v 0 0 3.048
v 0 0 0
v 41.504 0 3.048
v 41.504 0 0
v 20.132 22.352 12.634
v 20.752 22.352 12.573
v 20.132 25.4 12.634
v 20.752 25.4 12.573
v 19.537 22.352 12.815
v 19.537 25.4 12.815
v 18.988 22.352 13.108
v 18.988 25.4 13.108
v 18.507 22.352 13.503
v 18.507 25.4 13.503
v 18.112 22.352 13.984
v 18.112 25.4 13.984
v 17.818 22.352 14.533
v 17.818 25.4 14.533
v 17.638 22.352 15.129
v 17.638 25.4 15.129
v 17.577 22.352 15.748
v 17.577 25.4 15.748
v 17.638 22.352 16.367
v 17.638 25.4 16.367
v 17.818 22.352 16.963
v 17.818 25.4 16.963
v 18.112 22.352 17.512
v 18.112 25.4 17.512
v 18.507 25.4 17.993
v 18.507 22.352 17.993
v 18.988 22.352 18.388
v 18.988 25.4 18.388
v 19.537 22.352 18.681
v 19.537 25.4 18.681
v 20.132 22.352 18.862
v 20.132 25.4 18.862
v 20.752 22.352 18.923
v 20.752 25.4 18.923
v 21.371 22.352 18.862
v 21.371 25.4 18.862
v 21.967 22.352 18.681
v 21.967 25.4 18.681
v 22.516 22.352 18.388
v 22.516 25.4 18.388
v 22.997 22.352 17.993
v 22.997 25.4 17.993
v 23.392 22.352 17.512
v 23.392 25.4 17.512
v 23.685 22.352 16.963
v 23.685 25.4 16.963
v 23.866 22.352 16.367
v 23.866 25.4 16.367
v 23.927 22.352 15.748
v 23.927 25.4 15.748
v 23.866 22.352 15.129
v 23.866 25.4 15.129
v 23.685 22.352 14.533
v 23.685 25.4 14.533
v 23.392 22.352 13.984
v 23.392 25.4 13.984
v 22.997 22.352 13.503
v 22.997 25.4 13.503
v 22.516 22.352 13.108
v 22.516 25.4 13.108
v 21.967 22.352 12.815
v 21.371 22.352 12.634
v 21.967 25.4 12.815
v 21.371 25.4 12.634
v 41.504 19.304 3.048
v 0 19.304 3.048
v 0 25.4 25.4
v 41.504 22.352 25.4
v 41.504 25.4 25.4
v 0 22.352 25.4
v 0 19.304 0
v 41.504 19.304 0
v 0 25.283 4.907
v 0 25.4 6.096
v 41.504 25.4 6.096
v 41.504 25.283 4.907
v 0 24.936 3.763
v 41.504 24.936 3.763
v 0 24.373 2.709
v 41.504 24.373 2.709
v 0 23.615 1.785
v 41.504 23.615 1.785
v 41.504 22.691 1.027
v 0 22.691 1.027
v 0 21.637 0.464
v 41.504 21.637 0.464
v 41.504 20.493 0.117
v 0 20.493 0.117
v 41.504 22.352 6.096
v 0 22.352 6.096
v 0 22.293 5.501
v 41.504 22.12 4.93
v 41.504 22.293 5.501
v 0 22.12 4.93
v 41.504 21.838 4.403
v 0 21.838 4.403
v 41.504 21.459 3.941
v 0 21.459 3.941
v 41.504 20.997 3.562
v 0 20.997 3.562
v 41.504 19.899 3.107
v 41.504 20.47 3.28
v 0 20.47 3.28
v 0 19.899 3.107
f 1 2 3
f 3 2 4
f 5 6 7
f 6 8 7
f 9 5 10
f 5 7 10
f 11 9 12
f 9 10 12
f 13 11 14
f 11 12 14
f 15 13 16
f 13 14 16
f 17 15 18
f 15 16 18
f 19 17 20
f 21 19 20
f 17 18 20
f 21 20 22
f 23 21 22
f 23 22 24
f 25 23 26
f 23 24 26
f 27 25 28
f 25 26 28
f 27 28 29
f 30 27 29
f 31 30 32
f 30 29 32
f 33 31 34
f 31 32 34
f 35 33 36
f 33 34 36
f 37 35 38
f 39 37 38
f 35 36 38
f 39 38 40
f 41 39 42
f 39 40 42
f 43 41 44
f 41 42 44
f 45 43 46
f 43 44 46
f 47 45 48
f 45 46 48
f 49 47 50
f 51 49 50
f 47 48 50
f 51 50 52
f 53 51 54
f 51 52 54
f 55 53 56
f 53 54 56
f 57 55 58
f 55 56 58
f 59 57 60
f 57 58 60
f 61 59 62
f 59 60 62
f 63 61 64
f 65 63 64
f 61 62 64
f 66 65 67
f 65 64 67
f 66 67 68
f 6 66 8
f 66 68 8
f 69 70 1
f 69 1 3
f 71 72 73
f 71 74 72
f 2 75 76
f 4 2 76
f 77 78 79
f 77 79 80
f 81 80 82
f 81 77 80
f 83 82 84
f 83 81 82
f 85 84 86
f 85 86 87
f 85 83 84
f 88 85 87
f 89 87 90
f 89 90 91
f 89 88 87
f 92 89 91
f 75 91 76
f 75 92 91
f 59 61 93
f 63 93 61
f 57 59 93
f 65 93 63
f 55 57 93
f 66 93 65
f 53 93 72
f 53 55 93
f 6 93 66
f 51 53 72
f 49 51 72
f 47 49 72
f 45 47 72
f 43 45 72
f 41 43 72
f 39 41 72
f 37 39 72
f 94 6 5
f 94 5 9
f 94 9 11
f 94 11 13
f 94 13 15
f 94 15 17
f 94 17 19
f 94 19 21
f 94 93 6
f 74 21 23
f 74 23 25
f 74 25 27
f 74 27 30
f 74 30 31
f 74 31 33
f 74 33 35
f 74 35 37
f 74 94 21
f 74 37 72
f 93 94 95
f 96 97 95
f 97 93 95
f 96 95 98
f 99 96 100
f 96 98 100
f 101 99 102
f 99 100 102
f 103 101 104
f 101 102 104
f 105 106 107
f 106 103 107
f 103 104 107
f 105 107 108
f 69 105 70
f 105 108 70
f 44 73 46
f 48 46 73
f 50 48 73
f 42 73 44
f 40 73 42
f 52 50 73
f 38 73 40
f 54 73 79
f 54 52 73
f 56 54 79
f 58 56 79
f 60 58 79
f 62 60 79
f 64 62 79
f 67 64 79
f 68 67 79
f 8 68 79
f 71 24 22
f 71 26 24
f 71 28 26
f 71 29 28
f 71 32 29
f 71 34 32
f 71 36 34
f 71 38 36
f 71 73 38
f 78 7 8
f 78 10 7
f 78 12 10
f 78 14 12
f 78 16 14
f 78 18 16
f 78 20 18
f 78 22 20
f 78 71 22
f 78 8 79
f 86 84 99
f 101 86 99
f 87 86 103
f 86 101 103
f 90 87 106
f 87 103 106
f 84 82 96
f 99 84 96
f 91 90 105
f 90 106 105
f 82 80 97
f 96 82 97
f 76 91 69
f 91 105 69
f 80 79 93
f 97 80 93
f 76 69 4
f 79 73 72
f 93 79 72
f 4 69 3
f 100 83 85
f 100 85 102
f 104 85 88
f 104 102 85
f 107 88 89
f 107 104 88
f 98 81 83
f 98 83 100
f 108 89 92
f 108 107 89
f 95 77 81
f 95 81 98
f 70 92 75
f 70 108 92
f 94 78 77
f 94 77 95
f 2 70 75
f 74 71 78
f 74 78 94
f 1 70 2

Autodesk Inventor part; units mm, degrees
ref_plane "YZ Plane" through (0, 0, 0) normal (1, 0, 0) x (0, 1, 0)
ref_plane "XZ Plane" through (0, 0, 0) normal (0, 1, 0) x (-1, 0, 0)
ref_plane "XY Plane" through (0, 0, 0) normal (0, 0, 1) x (1, 0, 0)
sketch "Sketch1" plane through (0, 0, 0) normal (0, 0, 1) x (1, 0, 0)
  line L0 (0, 0) -> (41.5036, 0)
  line L1 (41.5036, 0) -> (41.5036, 25.4)
  line L2 (41.5036, 25.4) -> (0, 25.4)
  line L3 (0, 25.4) -> (0, 0)
  dimension "d0" = 41.5036
  dimension "d1" = 25.4
extrude "Plate1" add sketch "Sketch1" along normal blind 3.048
sketch "Sketch3" plane through (0, 22.352, 0) normal (0, 1, 0) x (-1, 0, 0)
  line L0 (-41.5036, 0) -> (0, 0)
  line L1 (0, 0) -> (0, 25.4)
  line L2 (0, 25.4) -> (-41.5036, 25.4)
  line L3 (-41.5036, 25.4) -> (-41.5036, 0)
edge flange "Flange2" height 25.4 angle 90 thickness 3.048 bend radius 3.048 thickness toward (0, 1, 0) relief tear relief width 3.048 relief depth 1.524 edges at (20.7518, 25.4, 3.048) wall of the first edge with corners at (41.5036, 22.352, 0) (0, 22.352, 0) (0, 22.352, 25.4) (41.5036, 22.352, 25.4)
bend "Bend2"
corner "Corner2"
hole "Hole1" at (20.7518, 22.352, 15.748) direction (0, 1, 0) diameter 6.35 end through all
equation "\"d30\" = Thickness"
equation "\"d13\" = BendReliefWidth"
equation "\"d14\" = BendReliefDepth"
equation "\"d15\" = MinimumRemnant"
equation "\"d16\" = BendRadius"
equation "\"d19\" = BendRadius"
equation "\"d20\" = CornerReliefSize"
equation "\"d21\" = GapSize"
equation "\"d22\" = JacobiRadiusSize"
equation "\"BendRadius\" = Thickness"
equation "\"BendReliefWidth\" = Thickness"
equation "\"BendReliefDepth\" = 0.5 * Thickness"
equation "\"CornerReliefSize\" = 4 * Thickness"
equation "\"MinimumRemnant\" = 2 * Thickness"
equation "\"TransitionRadius\" = BendRadius"
equation "\"JacobiRadiusSize\" = BendRadius"
equation "\"GapSize\" = Thickness"
equation "\"d2\" = BendRadius"
equation "\"Thickness\" = 3.048"
properties part number "Chain Tension - L Bracket - Base"
